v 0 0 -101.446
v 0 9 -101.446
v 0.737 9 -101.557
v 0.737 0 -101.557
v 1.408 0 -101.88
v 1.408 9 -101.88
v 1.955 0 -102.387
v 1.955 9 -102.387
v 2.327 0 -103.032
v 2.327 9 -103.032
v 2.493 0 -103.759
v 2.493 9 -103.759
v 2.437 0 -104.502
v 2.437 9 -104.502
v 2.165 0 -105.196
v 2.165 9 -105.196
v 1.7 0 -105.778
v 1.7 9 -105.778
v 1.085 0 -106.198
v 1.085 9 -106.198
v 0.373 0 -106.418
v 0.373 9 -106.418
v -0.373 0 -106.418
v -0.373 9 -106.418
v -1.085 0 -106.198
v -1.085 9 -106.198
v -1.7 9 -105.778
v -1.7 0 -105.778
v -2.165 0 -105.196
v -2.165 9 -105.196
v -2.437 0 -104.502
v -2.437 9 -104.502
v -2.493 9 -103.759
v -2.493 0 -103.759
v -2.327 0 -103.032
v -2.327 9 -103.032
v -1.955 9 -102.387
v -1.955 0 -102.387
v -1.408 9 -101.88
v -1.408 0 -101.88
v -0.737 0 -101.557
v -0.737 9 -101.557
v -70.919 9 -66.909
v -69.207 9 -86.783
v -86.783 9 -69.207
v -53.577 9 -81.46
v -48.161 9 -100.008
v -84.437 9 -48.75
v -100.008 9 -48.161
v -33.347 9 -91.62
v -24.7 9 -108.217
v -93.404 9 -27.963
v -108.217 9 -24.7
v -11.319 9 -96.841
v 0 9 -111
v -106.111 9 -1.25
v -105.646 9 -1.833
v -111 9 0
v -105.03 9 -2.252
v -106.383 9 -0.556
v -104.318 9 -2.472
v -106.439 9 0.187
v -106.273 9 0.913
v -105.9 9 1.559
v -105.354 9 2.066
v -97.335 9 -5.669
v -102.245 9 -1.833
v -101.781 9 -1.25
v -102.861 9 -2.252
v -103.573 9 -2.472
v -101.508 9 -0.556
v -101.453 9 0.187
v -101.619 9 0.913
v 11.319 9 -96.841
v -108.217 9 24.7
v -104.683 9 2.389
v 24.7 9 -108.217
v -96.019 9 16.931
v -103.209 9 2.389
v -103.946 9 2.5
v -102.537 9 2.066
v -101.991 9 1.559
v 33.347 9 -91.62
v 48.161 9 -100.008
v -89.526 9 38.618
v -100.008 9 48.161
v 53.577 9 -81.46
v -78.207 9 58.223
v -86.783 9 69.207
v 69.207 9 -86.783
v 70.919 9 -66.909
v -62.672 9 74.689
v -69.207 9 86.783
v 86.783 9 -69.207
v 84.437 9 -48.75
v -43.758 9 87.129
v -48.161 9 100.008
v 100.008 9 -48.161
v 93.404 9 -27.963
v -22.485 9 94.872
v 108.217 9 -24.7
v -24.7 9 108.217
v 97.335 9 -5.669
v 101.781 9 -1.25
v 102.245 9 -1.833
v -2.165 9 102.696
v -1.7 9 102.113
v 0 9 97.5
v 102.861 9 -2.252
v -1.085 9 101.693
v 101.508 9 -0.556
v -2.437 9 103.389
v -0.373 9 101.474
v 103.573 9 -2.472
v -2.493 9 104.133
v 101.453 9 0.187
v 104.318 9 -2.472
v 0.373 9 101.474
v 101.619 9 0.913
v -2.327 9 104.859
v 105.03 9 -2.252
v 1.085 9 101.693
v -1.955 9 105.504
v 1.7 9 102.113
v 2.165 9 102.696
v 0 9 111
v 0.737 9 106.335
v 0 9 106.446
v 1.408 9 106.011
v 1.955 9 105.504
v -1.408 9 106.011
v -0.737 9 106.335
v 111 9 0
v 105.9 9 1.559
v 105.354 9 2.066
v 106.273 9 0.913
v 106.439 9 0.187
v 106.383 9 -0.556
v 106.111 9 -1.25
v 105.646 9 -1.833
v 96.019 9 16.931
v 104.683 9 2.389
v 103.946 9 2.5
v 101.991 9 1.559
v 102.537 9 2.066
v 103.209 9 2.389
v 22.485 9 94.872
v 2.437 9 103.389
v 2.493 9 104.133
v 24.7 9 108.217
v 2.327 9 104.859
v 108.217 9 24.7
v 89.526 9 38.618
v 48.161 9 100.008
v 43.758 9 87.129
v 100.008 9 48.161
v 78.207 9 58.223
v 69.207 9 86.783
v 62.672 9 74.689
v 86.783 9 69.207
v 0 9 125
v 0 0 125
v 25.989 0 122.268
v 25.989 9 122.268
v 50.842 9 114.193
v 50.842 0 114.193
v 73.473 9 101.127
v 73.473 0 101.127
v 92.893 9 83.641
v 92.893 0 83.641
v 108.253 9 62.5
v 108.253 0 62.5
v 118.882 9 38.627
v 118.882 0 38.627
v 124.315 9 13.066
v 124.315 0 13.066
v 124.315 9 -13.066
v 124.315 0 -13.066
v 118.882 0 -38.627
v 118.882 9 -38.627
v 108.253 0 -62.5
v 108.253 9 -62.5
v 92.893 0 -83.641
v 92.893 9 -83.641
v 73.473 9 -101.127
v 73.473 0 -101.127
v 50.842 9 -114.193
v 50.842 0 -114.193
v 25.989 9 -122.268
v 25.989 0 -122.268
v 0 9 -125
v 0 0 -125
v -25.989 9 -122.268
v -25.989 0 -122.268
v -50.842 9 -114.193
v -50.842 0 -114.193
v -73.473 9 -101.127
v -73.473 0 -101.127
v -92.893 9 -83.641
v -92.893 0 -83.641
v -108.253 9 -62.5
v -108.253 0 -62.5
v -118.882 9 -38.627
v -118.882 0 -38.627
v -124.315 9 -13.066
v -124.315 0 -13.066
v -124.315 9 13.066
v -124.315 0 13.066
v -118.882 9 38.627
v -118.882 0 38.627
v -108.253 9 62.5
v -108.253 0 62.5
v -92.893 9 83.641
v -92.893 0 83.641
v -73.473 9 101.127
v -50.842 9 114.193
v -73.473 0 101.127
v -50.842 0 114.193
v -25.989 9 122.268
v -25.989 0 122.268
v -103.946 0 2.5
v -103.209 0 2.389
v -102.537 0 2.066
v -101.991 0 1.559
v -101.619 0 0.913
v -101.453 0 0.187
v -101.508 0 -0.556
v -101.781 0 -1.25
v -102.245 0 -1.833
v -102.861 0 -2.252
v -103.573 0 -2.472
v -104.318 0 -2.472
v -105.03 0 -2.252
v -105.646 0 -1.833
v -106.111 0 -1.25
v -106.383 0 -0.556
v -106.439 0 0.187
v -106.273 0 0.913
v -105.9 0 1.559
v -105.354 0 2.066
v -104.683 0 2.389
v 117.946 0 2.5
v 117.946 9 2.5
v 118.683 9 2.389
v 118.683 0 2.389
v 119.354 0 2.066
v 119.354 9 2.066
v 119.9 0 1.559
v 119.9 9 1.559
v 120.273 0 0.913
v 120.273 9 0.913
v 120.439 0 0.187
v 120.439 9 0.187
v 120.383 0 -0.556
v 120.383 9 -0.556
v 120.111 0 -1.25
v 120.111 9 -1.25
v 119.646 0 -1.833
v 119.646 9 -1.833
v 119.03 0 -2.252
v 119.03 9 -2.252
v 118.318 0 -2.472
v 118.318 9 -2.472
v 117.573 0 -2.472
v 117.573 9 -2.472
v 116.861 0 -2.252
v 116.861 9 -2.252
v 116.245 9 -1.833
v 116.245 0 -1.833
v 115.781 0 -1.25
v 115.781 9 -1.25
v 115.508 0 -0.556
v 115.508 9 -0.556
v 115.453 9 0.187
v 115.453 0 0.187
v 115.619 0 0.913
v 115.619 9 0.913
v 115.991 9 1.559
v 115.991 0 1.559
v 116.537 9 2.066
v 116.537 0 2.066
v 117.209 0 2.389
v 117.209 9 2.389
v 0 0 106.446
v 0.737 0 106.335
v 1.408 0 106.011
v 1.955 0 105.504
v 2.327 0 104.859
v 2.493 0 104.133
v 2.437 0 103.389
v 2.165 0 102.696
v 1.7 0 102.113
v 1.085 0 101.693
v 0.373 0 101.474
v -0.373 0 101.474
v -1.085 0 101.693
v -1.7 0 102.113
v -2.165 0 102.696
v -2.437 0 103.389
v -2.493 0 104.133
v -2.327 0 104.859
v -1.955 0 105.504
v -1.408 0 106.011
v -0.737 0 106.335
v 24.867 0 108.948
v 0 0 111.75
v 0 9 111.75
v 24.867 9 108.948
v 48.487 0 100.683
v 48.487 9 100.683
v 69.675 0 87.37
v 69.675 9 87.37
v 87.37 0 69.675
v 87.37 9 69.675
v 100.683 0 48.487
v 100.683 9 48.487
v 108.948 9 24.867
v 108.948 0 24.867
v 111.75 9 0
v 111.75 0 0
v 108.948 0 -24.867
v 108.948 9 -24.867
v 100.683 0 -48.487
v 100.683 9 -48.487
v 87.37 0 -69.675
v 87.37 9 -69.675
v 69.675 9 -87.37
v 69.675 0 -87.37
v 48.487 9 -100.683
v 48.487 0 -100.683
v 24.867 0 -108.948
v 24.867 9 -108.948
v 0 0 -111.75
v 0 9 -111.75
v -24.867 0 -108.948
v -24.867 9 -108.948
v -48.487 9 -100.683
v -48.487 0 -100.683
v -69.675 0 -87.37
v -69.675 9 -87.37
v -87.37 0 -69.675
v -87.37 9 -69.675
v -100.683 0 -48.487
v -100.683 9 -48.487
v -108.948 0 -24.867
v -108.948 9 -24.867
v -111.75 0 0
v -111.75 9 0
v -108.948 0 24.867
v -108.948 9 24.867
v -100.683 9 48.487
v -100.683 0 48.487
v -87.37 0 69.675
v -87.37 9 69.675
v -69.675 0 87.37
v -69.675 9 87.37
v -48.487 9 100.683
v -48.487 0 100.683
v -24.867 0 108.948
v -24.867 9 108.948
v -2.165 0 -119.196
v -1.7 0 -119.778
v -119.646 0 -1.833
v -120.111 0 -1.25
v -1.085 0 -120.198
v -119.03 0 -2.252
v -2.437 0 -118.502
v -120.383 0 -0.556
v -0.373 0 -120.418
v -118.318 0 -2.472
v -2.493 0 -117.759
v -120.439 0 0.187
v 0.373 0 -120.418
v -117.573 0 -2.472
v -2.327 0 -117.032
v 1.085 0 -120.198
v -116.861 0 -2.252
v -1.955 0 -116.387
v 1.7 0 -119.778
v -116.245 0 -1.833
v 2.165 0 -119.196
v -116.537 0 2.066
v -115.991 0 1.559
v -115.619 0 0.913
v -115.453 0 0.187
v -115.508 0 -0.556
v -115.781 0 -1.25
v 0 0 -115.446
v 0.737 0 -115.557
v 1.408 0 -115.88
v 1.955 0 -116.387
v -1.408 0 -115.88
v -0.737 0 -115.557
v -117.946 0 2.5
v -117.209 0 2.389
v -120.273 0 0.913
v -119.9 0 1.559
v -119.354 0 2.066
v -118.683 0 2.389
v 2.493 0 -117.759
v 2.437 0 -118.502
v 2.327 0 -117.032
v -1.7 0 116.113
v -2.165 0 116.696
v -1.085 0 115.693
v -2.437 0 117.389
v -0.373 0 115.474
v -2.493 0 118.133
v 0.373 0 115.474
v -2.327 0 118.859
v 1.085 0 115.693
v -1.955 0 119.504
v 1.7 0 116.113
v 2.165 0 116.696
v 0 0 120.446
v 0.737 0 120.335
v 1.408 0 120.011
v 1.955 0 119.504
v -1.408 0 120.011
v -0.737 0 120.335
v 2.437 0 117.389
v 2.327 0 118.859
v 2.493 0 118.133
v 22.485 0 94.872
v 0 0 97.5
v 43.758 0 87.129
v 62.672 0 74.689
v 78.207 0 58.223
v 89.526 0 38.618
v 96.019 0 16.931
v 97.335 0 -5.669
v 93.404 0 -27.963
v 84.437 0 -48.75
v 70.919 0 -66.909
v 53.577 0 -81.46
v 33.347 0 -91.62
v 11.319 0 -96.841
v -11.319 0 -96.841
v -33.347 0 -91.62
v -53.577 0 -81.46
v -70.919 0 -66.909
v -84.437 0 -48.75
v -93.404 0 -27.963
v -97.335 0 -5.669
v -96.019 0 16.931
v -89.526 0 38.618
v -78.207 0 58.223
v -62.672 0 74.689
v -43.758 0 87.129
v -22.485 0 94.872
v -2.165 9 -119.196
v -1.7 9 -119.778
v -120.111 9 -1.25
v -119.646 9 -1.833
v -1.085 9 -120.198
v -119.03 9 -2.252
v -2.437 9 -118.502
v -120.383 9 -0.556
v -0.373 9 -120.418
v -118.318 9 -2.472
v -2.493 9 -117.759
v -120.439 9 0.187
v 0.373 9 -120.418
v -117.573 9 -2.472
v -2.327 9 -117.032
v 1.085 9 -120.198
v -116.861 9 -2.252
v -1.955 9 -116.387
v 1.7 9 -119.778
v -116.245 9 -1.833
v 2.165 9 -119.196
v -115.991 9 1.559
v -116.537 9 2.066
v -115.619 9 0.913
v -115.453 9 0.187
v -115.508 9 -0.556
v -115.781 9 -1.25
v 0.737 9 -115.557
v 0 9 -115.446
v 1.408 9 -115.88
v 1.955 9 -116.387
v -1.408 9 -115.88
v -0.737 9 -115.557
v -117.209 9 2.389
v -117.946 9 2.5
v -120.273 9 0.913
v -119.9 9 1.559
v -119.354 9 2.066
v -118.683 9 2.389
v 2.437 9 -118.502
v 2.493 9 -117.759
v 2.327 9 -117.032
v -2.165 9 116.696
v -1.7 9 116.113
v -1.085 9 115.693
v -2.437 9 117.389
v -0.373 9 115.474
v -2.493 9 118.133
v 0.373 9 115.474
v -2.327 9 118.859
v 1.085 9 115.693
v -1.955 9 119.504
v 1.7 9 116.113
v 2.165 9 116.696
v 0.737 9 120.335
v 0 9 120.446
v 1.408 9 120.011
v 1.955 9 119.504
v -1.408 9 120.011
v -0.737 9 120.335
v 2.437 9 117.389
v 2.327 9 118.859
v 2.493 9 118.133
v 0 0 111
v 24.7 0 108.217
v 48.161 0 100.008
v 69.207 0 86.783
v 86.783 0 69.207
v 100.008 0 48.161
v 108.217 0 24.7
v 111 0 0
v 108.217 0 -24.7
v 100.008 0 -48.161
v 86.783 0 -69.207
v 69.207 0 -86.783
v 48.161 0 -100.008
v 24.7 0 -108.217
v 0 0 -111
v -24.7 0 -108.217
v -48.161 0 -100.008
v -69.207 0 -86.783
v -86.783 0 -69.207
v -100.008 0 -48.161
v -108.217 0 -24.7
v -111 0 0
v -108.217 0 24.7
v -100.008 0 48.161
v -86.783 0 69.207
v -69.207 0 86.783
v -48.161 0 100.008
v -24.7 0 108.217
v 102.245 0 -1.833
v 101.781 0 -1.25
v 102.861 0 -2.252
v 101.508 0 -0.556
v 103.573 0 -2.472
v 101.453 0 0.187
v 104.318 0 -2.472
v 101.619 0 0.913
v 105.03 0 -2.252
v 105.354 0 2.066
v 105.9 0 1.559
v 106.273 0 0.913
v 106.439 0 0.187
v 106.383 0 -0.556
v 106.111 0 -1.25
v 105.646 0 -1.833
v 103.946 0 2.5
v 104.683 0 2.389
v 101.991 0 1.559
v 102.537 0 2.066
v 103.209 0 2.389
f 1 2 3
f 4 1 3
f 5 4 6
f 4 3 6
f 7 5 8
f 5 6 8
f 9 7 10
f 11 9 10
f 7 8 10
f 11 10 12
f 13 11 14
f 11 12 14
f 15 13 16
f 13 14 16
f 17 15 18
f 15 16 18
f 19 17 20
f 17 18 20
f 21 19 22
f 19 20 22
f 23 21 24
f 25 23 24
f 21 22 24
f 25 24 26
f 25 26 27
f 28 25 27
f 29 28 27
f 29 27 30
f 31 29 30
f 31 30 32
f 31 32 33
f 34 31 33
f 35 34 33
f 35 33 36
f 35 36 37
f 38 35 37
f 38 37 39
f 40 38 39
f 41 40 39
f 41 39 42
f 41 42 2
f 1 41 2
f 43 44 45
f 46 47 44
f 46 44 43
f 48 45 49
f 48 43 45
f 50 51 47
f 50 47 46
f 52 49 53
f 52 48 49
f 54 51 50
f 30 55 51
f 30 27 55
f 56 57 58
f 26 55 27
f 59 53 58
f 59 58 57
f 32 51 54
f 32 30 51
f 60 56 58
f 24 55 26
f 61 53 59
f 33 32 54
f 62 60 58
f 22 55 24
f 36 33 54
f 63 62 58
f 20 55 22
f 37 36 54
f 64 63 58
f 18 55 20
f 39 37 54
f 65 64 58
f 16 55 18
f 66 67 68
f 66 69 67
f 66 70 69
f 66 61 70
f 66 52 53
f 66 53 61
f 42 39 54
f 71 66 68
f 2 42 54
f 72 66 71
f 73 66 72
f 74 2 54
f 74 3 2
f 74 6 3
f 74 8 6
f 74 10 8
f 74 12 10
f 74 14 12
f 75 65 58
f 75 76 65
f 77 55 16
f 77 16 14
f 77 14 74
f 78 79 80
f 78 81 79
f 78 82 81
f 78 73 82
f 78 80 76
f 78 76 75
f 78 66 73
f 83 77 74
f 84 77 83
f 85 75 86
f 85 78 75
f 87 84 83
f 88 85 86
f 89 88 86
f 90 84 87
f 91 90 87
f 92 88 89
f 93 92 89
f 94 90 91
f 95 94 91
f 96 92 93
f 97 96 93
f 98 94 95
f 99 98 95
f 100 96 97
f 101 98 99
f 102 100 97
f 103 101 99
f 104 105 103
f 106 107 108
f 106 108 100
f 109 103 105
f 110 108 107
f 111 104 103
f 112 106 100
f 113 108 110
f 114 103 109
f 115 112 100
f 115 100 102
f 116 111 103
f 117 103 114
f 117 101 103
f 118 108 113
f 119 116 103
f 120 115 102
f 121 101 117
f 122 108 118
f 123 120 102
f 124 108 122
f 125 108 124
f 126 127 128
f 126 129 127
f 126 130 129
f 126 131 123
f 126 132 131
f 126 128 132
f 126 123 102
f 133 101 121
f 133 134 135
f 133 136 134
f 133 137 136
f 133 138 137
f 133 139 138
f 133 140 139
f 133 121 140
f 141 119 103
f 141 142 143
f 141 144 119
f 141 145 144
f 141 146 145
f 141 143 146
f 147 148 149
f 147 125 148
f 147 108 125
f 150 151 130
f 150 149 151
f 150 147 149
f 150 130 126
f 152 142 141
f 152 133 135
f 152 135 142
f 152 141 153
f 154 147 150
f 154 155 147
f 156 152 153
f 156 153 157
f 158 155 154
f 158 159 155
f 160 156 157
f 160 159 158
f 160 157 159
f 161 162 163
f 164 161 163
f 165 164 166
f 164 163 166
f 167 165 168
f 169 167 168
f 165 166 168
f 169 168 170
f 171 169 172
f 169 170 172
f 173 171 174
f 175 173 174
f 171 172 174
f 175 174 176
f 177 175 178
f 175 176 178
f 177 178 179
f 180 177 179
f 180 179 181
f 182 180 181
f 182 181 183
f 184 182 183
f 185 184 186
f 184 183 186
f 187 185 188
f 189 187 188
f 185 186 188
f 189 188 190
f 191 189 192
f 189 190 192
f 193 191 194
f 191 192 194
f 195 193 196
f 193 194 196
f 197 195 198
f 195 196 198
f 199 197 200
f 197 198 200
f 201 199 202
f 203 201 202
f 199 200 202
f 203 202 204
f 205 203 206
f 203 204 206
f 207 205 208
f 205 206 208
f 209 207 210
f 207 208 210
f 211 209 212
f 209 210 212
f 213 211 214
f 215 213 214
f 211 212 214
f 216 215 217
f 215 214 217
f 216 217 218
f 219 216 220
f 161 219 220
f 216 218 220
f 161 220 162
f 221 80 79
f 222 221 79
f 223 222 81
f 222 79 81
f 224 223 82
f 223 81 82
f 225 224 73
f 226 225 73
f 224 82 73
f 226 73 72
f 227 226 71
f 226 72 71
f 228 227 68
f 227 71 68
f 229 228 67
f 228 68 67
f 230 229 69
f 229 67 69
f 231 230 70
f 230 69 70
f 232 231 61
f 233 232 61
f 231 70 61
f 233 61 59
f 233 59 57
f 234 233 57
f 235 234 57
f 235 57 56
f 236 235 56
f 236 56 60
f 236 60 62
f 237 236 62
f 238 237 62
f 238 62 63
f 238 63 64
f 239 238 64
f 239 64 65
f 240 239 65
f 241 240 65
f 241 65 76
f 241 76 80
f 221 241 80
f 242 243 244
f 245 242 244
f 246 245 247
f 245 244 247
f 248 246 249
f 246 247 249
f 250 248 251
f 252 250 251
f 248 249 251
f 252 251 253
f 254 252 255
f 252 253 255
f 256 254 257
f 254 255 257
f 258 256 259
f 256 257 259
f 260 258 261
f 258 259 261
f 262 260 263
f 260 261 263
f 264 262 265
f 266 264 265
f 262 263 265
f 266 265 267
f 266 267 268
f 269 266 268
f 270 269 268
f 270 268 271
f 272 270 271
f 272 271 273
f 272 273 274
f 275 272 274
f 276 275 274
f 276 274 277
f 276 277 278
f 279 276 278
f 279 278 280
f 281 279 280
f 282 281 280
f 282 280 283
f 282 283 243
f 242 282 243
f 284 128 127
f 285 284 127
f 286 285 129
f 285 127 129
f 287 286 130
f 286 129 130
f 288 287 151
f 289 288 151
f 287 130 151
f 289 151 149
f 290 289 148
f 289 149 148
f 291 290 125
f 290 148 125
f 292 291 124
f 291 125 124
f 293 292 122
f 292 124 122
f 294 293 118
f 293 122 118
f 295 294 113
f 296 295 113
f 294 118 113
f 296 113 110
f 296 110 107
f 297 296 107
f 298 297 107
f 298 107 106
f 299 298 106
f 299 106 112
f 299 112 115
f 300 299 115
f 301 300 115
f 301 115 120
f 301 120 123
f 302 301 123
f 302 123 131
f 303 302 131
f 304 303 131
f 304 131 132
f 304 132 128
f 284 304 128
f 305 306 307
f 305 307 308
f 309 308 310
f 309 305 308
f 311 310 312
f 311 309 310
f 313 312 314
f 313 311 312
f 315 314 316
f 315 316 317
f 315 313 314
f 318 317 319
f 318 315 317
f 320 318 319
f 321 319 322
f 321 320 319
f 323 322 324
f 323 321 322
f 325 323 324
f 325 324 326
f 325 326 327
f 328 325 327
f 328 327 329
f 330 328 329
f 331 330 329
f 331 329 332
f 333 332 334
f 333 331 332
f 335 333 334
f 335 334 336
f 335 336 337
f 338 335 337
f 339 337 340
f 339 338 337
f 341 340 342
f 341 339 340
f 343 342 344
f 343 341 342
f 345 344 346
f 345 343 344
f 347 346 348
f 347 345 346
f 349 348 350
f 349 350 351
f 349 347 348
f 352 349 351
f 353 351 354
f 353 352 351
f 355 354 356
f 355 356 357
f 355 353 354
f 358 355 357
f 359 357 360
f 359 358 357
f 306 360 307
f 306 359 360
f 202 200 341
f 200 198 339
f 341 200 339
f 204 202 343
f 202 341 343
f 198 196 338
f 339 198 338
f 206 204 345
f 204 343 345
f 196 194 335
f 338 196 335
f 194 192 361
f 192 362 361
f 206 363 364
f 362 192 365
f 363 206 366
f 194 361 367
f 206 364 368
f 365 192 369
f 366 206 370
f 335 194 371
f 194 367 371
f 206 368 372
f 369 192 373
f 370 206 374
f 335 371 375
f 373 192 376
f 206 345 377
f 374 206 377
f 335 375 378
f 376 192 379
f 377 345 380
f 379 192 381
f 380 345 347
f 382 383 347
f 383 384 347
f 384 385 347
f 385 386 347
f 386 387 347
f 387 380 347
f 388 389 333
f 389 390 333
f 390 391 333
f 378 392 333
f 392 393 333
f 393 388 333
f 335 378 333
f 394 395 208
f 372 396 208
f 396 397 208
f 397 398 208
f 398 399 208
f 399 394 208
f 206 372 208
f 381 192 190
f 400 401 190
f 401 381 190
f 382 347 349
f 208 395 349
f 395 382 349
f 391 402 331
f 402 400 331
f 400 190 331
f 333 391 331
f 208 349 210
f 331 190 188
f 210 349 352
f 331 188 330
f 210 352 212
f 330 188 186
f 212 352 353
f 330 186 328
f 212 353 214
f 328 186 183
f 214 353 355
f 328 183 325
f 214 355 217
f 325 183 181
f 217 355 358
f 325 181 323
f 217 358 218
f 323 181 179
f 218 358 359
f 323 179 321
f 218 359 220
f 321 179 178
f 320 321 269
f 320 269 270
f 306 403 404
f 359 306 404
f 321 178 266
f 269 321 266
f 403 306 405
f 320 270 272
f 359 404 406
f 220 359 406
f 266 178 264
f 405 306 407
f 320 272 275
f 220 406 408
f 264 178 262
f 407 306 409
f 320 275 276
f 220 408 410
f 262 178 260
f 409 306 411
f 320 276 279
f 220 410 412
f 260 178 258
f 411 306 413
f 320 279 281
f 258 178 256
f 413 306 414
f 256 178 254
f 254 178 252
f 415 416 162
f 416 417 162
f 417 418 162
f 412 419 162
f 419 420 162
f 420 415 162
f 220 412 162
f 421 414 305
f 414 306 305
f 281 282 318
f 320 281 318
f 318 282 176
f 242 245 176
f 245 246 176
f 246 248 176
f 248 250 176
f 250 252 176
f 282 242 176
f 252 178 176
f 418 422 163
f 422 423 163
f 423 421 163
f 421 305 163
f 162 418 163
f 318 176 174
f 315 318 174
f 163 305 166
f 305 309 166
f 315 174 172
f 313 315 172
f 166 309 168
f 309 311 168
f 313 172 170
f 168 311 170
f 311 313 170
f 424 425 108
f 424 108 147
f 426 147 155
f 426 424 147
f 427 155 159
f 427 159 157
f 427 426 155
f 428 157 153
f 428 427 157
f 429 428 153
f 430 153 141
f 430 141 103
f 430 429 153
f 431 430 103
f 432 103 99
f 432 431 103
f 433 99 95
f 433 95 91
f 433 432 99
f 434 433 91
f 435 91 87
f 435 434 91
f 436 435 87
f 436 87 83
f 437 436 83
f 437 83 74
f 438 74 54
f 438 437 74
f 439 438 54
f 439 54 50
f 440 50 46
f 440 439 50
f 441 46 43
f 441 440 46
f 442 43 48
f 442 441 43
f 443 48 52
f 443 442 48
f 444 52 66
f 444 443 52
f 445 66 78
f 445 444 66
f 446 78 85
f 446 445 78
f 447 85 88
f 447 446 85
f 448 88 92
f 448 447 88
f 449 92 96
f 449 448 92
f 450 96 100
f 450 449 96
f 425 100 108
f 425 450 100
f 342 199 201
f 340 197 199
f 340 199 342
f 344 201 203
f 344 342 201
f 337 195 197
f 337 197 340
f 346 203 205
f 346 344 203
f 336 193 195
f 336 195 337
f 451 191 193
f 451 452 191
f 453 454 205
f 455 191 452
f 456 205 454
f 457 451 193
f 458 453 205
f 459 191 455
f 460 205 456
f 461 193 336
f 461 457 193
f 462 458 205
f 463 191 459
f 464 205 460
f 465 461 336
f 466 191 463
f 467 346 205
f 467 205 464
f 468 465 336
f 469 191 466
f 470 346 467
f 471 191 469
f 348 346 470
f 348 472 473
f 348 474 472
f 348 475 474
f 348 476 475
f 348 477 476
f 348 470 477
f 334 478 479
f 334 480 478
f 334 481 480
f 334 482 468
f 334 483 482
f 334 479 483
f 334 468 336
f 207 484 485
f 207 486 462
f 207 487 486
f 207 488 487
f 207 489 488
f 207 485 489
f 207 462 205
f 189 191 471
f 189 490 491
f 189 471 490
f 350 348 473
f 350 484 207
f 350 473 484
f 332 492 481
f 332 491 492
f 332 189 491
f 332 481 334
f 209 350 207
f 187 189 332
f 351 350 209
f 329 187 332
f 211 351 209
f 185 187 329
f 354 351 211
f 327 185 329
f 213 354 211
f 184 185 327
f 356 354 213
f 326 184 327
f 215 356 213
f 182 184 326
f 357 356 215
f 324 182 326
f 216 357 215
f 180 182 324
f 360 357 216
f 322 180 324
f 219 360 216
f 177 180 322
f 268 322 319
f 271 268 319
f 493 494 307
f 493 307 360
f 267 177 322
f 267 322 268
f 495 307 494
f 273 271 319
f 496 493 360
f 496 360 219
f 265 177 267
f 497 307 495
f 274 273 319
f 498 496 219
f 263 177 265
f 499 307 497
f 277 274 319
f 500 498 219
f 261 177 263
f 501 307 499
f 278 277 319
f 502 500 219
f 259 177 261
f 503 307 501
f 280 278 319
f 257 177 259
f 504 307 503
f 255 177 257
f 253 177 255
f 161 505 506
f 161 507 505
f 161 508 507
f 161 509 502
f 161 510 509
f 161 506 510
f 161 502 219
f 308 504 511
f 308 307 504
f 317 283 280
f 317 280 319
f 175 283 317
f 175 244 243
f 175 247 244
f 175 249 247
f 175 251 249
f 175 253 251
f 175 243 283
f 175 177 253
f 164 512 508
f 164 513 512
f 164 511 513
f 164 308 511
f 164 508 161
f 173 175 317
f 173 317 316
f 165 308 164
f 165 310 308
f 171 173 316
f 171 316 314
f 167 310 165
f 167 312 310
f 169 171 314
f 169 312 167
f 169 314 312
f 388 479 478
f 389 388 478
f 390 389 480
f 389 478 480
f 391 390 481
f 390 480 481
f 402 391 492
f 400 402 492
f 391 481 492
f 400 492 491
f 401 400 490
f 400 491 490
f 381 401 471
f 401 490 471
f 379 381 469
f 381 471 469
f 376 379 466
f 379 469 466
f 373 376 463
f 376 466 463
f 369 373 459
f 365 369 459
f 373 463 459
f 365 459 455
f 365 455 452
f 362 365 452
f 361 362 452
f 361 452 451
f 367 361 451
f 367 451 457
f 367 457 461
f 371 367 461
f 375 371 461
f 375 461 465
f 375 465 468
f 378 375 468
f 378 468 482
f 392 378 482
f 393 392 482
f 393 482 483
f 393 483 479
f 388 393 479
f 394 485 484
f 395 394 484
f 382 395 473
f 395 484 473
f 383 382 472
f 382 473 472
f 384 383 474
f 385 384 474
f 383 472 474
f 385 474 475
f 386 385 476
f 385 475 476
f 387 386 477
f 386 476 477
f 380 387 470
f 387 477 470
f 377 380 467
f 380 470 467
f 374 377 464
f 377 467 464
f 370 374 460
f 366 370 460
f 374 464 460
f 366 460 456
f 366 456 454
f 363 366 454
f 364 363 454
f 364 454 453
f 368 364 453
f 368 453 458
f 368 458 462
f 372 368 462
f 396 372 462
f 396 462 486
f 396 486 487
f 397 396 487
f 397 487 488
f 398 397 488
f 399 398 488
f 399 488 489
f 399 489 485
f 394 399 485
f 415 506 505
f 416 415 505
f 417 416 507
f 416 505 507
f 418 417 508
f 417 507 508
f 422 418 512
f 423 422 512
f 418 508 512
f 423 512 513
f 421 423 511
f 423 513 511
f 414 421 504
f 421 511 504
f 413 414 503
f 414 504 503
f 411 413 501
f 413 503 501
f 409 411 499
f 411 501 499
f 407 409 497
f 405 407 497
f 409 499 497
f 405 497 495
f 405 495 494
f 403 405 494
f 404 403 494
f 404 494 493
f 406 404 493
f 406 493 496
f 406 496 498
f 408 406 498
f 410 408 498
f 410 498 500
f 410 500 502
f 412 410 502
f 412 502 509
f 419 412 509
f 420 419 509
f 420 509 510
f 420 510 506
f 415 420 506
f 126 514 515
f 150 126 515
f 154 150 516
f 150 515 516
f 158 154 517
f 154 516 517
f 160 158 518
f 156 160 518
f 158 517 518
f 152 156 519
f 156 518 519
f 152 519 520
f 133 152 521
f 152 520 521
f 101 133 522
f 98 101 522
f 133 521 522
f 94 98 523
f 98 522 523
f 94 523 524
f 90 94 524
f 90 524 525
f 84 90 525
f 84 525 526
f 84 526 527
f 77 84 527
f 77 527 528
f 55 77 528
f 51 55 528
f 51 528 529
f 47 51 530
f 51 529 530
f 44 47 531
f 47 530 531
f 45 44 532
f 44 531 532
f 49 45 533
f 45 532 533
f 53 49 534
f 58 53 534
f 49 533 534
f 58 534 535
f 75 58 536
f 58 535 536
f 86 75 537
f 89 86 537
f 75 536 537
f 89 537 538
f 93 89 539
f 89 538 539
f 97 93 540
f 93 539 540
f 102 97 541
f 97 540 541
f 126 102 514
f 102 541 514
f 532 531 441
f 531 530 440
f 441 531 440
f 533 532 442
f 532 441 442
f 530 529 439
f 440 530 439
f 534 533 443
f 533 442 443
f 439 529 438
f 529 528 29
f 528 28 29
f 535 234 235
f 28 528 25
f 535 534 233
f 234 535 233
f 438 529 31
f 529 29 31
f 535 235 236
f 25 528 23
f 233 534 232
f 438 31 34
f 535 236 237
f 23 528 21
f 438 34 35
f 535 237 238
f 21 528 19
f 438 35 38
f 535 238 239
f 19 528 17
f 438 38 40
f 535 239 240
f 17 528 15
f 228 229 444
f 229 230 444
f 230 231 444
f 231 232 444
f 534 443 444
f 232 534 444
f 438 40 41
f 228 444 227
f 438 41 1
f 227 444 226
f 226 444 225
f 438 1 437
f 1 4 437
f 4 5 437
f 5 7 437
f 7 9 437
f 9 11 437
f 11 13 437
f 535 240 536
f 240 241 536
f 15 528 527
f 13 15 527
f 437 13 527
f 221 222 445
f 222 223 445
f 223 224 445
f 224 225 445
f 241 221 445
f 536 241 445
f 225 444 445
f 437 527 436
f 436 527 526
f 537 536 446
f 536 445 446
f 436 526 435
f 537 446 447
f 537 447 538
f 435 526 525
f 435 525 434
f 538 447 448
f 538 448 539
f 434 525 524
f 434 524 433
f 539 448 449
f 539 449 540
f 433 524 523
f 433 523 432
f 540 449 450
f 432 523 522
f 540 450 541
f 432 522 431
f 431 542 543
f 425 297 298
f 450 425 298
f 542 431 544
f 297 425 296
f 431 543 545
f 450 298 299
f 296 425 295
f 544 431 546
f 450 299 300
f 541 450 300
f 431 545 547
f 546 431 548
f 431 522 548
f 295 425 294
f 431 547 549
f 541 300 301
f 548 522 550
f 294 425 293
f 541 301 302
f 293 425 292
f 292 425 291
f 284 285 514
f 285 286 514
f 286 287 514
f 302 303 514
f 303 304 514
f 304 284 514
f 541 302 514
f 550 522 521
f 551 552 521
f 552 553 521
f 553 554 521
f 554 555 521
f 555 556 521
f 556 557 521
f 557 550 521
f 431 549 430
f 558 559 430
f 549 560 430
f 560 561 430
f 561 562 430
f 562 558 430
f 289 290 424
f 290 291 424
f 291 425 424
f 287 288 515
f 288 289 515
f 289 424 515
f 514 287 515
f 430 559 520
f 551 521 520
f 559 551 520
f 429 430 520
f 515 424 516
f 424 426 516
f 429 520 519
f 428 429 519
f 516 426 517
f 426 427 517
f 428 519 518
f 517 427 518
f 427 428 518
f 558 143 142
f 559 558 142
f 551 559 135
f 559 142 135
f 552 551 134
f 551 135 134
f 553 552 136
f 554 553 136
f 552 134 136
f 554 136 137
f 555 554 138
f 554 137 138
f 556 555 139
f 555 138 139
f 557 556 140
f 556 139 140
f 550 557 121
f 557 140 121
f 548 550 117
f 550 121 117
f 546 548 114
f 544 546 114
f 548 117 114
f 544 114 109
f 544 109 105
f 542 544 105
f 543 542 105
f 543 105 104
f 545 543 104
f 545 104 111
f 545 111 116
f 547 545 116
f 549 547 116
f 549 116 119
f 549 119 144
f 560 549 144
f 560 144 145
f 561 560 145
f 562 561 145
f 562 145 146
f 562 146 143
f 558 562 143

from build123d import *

# Parameters (mm, degrees)
SKETCH1_R           = 125
SKETCH1_R_2         = 111.75
BOSS_EXTRUDE1_DEPTH = 9
SKETCH2_R           = 111
SKETCH2_R_2         = 97.5
BOSS_EXTRUDE2_DEPTH = 9
SKETCH_1_R          = 2.5
CUT_EXTRUDE_1_DEPTH = 10
SKETCH_2_R          = 2.5
CUT_EXTRUDE_2_DEPTH = 10


with BuildPart() as part:
    # Sketch1 → Boss-Extrude1 (new body)
    with BuildSketch(Plane(origin=(0, 0, 0), x_dir=(1, 0, 0), z_dir=(0, 1, 0))):
        with Locations(Location((0, 0, 0), (0, 0, 270))):
            Circle(SKETCH1_R)
        with Locations(Location((0, 0, 0), (0, 0, 270))):
            Circle(SKETCH1_R_2, mode=Mode.SUBTRACT)
    extrude(amount=BOSS_EXTRUDE1_DEPTH)

    # 草图2 → 切除-拉伸2 (cut)
    with BuildSketch(Plane(origin=(0, 9, 0), x_dir=(1, 0, 0), z_dir=(0, 1, 0))):
        with Locations(Location((0, 117.9457, 0), (0, 0, 270))):
            Circle(SKETCH_2_R)
        with Locations(Location((117.9457, 0, 0), (0, 0, 270))):
            Circle(SKETCH_2_R)
        with Locations(Location((0, -117.9457, 0), (0, 0, 270))):
            Circle(SKETCH_2_R)
        with Locations(Location((-117.9457, 0, 0), (0, 0, 270))):
            Circle(SKETCH_2_R)
    extrude(amount=-CUT_EXTRUDE_2_DEPTH, mode=Mode.SUBTRACT)


with BuildPart() as body_2:
    # Sketch2 → Boss-Extrude2 (new body)
    with BuildSketch(Plane(origin=(0, 0, 0), x_dir=(1, 0, 0), z_dir=(0, 1, 0))):
        with Locations(Location((0, 0, 0), (0, 0, 270))):
            Circle(SKETCH2_R)
        with Locations(Location((0, 0, 0), (0, 0, 270))):
            Circle(SKETCH2_R_2, mode=Mode.SUBTRACT)
    extrude(amount=BOSS_EXTRUDE2_DEPTH)

    # 草图1 → 切除-拉伸1 (cut)
    with BuildSketch(Plane(origin=(0, 9, 0), x_dir=(1, 0, 0), z_dir=(0, 1, 0))):
        with Locations(Location((0, 103.9457, 0), (0, 0, 270))):
            Circle(SKETCH_1_R)
        with Locations(Location((103.9457, 0, 0), (0, 0, 270))):
            Circle(SKETCH_1_R)
        with Locations(Location((0, -103.9457, 0), (0, 0, 270))):
            Circle(SKETCH_1_R)
        with Locations(Location((-103.9457, 0, 0), (0, 0, 270))):
            Circle(SKETCH_1_R)
    extrude(amount=-CUT_EXTRUDE_1_DEPTH, mode=Mode.SUBTRACT)


solid = Compound([part.part, body_2.part])
